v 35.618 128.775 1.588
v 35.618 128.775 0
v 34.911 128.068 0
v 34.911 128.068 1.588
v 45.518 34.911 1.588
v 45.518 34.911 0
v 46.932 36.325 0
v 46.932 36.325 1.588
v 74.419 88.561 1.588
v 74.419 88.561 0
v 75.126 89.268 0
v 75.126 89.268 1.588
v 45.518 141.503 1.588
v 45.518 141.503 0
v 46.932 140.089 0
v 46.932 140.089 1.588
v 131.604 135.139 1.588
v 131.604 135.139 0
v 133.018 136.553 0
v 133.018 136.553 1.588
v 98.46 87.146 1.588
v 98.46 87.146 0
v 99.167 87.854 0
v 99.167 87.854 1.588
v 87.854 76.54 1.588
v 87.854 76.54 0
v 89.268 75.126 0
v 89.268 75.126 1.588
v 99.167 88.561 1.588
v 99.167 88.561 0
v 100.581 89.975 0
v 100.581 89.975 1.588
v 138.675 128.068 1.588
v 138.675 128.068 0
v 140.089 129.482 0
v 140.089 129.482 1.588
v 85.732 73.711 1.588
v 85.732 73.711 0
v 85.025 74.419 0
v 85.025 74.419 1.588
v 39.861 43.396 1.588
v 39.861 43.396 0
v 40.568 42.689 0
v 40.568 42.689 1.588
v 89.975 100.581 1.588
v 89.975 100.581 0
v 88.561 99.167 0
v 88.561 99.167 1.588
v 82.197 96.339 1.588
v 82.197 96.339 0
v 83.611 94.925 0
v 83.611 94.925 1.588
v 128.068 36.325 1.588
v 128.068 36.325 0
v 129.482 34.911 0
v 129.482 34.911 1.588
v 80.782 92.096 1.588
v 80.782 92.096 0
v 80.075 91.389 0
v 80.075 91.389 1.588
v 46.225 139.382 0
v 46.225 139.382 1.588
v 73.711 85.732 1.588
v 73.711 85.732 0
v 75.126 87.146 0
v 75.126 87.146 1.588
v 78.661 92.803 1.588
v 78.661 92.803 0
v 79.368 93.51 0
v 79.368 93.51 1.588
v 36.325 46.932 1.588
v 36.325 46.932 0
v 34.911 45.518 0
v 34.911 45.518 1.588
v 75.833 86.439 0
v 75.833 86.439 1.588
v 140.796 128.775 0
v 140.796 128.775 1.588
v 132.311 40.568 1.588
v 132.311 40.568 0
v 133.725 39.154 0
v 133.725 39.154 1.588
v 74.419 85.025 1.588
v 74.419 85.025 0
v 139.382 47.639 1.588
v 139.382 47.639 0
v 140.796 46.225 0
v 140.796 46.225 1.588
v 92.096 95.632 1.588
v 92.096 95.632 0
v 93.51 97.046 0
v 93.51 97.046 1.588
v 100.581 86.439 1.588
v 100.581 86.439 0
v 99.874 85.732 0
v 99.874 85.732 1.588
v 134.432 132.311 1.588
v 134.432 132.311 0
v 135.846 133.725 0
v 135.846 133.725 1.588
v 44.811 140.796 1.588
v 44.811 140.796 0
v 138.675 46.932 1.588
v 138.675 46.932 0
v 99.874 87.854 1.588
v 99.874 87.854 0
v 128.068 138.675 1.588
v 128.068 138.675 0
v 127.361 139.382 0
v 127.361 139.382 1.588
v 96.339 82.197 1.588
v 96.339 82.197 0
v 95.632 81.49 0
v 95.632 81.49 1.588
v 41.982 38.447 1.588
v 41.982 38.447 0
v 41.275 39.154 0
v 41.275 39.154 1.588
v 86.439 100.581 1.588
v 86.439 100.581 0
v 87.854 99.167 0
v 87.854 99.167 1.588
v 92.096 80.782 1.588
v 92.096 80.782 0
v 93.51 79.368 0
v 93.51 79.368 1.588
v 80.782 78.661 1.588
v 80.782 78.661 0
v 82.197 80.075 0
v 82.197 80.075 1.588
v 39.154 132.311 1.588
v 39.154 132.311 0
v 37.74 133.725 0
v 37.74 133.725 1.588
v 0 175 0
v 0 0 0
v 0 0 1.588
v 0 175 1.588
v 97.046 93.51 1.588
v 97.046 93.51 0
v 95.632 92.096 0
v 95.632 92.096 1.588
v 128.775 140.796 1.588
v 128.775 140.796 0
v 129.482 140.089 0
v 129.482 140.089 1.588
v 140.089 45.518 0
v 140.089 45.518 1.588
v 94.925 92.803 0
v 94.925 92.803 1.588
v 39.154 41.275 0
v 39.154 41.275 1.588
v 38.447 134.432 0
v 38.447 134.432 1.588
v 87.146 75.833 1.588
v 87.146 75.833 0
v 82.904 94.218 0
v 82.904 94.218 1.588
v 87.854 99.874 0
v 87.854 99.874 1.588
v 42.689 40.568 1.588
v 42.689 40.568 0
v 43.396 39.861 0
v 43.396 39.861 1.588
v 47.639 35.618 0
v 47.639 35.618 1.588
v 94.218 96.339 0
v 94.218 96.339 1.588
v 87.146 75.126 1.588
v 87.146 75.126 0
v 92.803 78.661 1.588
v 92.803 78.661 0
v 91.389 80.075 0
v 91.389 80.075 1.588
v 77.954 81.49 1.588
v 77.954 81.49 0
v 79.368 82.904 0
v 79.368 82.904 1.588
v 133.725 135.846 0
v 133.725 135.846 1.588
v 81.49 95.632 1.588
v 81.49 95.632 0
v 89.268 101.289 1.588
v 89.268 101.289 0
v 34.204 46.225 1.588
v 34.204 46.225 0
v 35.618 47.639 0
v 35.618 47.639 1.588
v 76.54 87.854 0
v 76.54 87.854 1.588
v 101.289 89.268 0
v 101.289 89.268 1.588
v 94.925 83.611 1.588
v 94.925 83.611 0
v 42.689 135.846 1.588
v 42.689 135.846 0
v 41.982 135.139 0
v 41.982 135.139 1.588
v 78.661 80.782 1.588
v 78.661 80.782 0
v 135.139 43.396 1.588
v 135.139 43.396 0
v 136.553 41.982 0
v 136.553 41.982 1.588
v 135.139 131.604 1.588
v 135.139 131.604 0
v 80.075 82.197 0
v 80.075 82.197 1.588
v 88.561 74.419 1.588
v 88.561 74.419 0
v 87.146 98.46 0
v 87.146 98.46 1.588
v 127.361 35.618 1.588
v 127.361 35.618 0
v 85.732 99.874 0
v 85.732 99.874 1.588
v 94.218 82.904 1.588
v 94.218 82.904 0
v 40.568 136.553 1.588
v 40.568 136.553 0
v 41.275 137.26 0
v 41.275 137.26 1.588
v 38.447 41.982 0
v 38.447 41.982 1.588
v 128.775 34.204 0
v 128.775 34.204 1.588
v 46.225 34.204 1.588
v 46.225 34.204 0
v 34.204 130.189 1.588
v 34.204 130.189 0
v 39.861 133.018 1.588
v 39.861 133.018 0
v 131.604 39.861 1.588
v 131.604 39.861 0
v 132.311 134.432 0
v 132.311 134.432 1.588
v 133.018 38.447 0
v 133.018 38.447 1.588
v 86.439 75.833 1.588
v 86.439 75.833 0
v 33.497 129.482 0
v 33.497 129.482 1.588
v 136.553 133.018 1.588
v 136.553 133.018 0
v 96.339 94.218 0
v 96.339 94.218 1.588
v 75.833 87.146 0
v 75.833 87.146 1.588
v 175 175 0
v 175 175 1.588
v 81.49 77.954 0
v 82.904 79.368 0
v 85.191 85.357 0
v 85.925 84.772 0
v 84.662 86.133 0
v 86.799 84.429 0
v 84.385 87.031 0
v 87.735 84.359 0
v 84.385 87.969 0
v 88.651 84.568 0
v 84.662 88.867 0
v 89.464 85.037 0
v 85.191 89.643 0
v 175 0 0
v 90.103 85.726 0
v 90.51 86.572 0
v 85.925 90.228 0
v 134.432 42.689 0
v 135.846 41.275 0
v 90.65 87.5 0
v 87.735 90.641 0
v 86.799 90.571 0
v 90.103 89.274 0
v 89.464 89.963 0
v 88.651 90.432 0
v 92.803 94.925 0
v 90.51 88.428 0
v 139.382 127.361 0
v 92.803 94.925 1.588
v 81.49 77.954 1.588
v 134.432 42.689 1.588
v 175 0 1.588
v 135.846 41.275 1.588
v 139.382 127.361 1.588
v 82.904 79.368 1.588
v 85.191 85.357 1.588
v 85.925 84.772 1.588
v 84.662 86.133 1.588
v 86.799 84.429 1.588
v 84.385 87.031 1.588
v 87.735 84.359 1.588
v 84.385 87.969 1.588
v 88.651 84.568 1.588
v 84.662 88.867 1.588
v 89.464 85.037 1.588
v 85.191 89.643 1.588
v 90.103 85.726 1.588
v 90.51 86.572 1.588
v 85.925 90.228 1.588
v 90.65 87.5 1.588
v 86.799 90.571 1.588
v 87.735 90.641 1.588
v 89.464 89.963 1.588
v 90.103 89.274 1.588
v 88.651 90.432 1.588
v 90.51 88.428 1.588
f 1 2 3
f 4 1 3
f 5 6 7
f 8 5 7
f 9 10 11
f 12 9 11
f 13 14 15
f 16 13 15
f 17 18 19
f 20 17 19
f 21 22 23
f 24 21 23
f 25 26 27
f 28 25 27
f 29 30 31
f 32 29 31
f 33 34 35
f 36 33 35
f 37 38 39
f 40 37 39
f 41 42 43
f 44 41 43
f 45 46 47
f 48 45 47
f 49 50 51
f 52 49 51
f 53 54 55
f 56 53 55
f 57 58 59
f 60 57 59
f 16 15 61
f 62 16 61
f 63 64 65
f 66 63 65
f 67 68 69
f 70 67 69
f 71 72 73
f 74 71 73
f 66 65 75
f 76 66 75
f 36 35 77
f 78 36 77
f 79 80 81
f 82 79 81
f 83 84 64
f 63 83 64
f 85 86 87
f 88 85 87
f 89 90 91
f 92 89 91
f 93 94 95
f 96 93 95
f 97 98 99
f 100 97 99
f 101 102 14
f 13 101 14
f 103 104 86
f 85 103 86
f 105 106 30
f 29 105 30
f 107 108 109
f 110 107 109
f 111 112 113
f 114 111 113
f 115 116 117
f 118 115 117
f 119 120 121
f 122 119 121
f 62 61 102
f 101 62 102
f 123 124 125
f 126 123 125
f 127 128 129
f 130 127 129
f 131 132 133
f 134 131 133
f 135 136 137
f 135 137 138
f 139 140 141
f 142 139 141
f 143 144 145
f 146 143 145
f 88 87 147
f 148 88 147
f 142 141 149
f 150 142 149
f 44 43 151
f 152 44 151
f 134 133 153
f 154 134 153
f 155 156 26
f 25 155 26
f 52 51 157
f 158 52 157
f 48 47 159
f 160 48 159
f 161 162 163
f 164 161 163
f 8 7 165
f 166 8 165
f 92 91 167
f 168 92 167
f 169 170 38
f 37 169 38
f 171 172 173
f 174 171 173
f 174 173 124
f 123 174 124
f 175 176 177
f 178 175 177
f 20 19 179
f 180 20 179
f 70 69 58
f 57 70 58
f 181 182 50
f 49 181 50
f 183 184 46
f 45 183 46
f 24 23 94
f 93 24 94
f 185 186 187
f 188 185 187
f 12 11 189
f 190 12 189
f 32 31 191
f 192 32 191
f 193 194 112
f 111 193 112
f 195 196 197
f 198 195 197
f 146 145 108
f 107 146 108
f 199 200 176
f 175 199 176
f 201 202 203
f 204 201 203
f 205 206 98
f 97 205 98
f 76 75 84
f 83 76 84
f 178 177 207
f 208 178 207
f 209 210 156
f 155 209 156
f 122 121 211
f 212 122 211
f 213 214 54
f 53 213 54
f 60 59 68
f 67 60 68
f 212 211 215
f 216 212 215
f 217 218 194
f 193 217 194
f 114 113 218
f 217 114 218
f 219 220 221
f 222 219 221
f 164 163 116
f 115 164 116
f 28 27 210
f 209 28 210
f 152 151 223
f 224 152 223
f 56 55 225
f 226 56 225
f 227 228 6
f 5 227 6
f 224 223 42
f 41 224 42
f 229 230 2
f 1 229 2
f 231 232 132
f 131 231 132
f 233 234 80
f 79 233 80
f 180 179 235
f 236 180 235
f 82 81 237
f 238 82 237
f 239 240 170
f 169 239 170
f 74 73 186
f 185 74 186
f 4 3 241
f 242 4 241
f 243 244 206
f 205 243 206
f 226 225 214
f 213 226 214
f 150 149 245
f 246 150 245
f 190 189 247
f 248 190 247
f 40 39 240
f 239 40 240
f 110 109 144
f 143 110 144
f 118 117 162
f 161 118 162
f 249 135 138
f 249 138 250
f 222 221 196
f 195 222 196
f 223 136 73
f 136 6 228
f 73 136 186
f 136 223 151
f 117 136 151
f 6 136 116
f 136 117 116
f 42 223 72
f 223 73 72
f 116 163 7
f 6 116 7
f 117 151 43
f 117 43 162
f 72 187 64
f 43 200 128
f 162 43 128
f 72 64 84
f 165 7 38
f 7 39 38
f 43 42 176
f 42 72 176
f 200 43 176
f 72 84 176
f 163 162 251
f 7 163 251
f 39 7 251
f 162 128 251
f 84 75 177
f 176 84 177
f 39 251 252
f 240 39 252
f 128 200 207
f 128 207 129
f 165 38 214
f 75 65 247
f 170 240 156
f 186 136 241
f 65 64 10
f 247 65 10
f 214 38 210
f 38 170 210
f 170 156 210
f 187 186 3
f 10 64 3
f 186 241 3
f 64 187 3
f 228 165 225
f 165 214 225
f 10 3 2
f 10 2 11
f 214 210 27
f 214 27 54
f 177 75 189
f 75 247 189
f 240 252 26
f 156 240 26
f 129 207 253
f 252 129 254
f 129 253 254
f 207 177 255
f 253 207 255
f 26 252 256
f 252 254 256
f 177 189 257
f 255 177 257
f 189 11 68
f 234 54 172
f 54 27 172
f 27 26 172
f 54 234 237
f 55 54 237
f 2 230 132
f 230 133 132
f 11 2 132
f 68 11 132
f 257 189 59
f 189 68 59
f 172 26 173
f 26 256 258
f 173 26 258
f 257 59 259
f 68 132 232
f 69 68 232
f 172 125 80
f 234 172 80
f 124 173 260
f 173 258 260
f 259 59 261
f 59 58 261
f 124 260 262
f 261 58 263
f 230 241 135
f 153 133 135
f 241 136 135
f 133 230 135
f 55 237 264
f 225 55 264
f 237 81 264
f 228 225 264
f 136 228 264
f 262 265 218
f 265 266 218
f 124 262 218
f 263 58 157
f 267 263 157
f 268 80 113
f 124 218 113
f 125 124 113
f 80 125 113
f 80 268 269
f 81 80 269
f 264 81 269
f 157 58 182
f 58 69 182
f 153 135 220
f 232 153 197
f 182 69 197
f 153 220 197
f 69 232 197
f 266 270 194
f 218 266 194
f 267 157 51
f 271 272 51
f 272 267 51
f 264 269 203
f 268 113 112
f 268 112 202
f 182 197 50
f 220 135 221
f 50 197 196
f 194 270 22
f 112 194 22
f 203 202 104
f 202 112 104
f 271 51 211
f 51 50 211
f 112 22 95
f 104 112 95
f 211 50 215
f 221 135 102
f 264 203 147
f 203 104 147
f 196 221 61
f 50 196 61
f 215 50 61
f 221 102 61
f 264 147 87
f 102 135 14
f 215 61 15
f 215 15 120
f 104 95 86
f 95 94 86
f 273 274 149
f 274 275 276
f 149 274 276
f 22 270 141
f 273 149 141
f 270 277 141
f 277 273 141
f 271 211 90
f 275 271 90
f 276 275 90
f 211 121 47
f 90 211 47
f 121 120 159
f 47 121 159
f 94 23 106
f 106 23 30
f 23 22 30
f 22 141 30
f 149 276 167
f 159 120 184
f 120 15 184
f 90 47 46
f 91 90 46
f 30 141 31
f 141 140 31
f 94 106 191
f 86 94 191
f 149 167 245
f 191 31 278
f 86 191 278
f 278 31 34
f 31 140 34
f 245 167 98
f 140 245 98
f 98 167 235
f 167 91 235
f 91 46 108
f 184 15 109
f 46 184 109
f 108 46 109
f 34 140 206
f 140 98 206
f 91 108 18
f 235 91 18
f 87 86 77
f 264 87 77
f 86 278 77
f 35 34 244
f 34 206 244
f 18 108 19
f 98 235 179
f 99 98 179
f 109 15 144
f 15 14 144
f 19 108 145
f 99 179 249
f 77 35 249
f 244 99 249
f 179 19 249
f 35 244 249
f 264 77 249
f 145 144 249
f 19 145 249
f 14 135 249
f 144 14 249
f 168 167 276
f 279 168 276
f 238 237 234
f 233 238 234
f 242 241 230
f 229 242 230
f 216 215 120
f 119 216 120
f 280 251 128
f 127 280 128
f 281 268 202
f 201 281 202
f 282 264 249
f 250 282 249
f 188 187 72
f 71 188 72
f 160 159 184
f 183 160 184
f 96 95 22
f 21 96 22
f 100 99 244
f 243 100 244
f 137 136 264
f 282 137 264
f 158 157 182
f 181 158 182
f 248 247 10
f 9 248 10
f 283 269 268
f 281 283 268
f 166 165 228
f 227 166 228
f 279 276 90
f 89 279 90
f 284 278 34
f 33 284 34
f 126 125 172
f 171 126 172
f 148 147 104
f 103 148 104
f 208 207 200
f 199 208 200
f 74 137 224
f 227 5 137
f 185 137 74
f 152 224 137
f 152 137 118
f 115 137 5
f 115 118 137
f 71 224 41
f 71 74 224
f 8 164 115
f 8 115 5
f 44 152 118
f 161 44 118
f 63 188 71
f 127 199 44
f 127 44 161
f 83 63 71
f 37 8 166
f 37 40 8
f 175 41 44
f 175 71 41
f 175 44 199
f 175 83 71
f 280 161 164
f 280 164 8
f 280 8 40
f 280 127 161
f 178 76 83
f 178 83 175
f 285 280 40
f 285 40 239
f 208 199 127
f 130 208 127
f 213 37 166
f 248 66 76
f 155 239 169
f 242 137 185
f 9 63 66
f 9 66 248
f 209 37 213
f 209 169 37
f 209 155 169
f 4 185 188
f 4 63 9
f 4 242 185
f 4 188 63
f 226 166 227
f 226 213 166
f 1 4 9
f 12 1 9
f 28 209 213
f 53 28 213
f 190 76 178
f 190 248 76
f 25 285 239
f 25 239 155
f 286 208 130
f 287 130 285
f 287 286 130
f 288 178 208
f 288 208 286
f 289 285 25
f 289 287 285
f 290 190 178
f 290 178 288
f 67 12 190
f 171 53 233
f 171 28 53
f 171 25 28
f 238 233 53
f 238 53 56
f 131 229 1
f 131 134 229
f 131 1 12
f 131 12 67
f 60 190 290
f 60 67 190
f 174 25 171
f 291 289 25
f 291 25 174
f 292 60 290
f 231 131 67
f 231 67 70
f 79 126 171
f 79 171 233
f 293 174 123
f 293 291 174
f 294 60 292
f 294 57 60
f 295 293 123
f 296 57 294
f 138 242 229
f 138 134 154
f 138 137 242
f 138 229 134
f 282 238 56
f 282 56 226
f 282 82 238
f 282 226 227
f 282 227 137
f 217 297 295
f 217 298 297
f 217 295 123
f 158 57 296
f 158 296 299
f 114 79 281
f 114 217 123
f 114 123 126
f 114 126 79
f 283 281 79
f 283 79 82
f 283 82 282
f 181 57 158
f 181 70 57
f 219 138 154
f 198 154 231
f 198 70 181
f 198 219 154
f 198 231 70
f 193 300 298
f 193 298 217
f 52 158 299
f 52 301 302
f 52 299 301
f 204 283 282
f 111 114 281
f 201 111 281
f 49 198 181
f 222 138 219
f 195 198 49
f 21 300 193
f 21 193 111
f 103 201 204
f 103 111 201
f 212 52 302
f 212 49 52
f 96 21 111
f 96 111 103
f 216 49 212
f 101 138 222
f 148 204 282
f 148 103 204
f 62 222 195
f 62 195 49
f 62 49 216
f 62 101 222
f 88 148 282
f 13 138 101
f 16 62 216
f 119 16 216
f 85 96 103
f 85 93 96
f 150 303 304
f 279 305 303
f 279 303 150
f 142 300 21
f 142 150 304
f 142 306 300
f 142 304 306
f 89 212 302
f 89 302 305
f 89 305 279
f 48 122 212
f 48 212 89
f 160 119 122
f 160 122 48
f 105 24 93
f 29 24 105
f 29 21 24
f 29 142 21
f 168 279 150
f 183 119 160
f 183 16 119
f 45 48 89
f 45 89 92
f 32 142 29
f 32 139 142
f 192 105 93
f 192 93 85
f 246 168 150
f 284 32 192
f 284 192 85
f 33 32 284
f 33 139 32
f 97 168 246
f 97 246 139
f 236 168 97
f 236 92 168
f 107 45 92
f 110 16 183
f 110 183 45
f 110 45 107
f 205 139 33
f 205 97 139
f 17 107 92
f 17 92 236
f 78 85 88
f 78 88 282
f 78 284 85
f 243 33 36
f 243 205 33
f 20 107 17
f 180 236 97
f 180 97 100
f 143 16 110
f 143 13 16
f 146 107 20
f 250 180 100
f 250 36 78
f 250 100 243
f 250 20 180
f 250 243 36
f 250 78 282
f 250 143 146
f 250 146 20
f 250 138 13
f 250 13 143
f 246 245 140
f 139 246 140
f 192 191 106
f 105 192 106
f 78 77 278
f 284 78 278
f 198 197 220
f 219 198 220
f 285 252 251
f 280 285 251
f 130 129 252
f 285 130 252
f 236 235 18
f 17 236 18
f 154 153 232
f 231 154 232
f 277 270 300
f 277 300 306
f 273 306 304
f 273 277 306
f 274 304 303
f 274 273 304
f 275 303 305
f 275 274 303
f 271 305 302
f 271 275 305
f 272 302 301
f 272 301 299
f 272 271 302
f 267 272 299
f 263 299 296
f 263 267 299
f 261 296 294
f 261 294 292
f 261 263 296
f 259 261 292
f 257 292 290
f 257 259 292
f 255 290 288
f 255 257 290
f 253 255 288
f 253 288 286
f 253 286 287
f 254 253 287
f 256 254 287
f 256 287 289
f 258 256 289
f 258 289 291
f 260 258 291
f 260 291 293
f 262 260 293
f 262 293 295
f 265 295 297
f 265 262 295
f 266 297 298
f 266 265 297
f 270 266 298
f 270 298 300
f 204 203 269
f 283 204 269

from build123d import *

# Parameters (mm, degrees)
MODEL_W             = 175
MODEL_H             = 175
MODEL_R             = 3.15
BOSS_EXTRUDE1_DEPTH = 1.5875


with BuildPart() as part:
    # Model → Boss-Extrude1 (new body)
    with BuildSketch(Plane.XY):
        with Locations((87.5, 87.5)):
            Rectangle(MODEL_W, MODEL_H)
        with Locations((87.5, 87.5)):
            Circle(MODEL_R, mode=Mode.SUBTRACT)
        Polygon((139.381727984, 47.639087297), (140.795941546, 46.224873734), (140.088834765, 45.517766953), (138.674621202, 46.931980515), align=None, mode=Mode.SUBTRACT)
        Polygon((135.139087297, 43.396446609), (136.553300859, 41.982233047), (135.846194078, 41.275126266), (134.431980515, 42.689339828), align=None, mode=Mode.SUBTRACT)
        Polygon((132.310660172, 40.568019485), (133.724873734, 39.153805922), (133.017766953, 38.446699141), (131.603553391, 39.860912703), align=None, mode=Mode.SUBTRACT)
        Polygon((128.068019485, 36.325378798), (129.482233047, 34.911165235), (128.775126266, 34.204058454), (127.360912703, 35.618272016), align=None, mode=Mode.SUBTRACT)
        Polygon((87.853553391, 76.539844892), (89.267766953, 75.125631329), (88.560660172, 74.418524548), (87.146446609, 75.83273811), align=None, mode=Mode.SUBTRACT)
        Polygon((92.096194078, 80.782485579), (93.51040764, 79.368272016), (92.803300859, 78.661165235), (91.389087297, 80.075378798), align=None, mode=Mode.SUBTRACT)
        Polygon((47.639087297, 35.618272016), (46.224873734, 34.204058454), (45.517766953, 34.911165235), (46.931980515, 36.325378798), align=None, mode=Mode.SUBTRACT)
        Polygon((43.396446609, 39.860912703), (41.982233047, 38.446699141), (41.275126266, 39.153805922), (42.689339828, 40.568019485), align=None, mode=Mode.SUBTRACT)
        Polygon((40.568019485, 42.689339828), (39.153805922, 41.275126266), (38.446699141, 41.982233047), (39.860912703, 43.396446609), align=None, mode=Mode.SUBTRACT)
        Polygon((36.325378798, 46.931980515), (34.911165235, 45.517766953), (34.204058454, 46.224873734), (35.618272016, 47.639087297), align=None, mode=Mode.SUBTRACT)
        Polygon((75.83273811, 86.439339828), (74.418524548, 85.025126266), (73.711417767, 85.732233047), (75.125631329, 87.146446609), align=None, mode=Mode.SUBTRACT)
        Polygon((80.075378798, 82.196699141), (78.661165235, 80.782485579), (77.954058454, 81.48959236), (79.368272016, 82.903805922), align=None, mode=Mode.SUBTRACT)
        Polygon((82.903805922, 79.368272016), (81.48959236, 77.954058454), (80.782485579, 78.661165235), (82.196699141, 80.075378798), align=None, mode=Mode.SUBTRACT)
        Polygon((87.146446609, 75.125631329), (85.732233047, 73.711417767), (85.025126266, 74.418524548), (86.439339828, 75.83273811), align=None, mode=Mode.SUBTRACT)
        Polygon((101.288582233, 89.267766953), (99.874368671, 87.853553391), (99.16726189, 88.560660172), (100.581475452, 89.974873734), align=None, mode=Mode.SUBTRACT)
        Polygon((97.045941546, 93.51040764), (95.631727984, 92.096194078), (94.924621202, 92.803300859), (96.338834765, 94.217514421), align=None, mode=Mode.SUBTRACT)
        Polygon((94.217514421, 96.338834765), (92.803300859, 94.924621202), (92.096194078, 95.631727984), (93.51040764, 97.045941546), align=None, mode=Mode.SUBTRACT)
        Polygon((89.974873734, 100.581475452), (88.560660172, 99.16726189), (87.853553391, 99.874368671), (89.267766953, 101.288582233), align=None, mode=Mode.SUBTRACT)
        Polygon((129.482233047, 140.088834765), (128.068019485, 138.674621202), (127.360912703, 139.381727984), (128.775126266, 140.795941546), align=None, mode=Mode.SUBTRACT)
        Polygon((133.724873734, 135.846194078), (132.310660172, 134.431980515), (131.603553391, 135.139087297), (133.017766953, 136.553300859), align=None, mode=Mode.SUBTRACT)
        Polygon((136.553300859, 133.017766953), (135.139087297, 131.603553391), (134.431980515, 132.310660172), (135.846194078, 133.724873734), align=None, mode=Mode.SUBTRACT)
        Polygon((140.795941546, 128.775126266), (139.381727984, 127.360912703), (138.674621202, 128.068019485), (140.088834765, 129.482233047), align=None, mode=Mode.SUBTRACT)
        Polygon((94.924621202, 83.610912703), (96.338834765, 82.196699141), (95.631727984, 81.48959236), (94.217514421, 82.903805922), align=None, mode=Mode.SUBTRACT)
        Polygon((99.16726189, 87.853553391), (100.581475452, 86.439339828), (99.874368671, 85.732233047), (98.460155108, 87.146446609), align=None, mode=Mode.SUBTRACT)
        Polygon((75.125631329, 89.267766953), (76.539844892, 87.853553391), (75.83273811, 87.146446609), (74.418524548, 88.560660172), align=None, mode=Mode.SUBTRACT)
        Polygon((79.368272016, 93.51040764), (80.782485579, 92.096194078), (80.075378798, 91.389087297), (78.661165235, 92.803300859), align=None, mode=Mode.SUBTRACT)
        Polygon((82.196699141, 96.338834765), (83.610912703, 94.924621202), (82.903805922, 94.217514421), (81.48959236, 95.631727984), align=None, mode=Mode.SUBTRACT)
        Polygon((86.439339828, 100.581475452), (87.853553391, 99.16726189), (87.146446609, 98.460155108), (85.732233047, 99.874368671), align=None, mode=Mode.SUBTRACT)
        Polygon((34.204058454, 130.189339828), (35.618272016, 128.775126266), (34.911165235, 128.068019485), (33.496951673, 129.482233047), align=None, mode=Mode.SUBTRACT)
        Polygon((38.446699141, 134.431980515), (39.860912703, 133.017766953), (39.153805922, 132.310660172), (37.73959236, 133.724873734), align=None, mode=Mode.SUBTRACT)
        Polygon((41.275126266, 137.26040764), (42.689339828, 135.846194078), (41.982233047, 135.139087297), (40.568019485, 136.553300859), align=None, mode=Mode.SUBTRACT)
        Polygon((45.517766953, 141.503048327), (46.931980515, 140.088834765), (46.224873734, 139.381727984), (44.810660172, 140.795941546), align=None, mode=Mode.SUBTRACT)
    extrude(amount=BOSS_EXTRUDE1_DEPTH)


solid = part.part
